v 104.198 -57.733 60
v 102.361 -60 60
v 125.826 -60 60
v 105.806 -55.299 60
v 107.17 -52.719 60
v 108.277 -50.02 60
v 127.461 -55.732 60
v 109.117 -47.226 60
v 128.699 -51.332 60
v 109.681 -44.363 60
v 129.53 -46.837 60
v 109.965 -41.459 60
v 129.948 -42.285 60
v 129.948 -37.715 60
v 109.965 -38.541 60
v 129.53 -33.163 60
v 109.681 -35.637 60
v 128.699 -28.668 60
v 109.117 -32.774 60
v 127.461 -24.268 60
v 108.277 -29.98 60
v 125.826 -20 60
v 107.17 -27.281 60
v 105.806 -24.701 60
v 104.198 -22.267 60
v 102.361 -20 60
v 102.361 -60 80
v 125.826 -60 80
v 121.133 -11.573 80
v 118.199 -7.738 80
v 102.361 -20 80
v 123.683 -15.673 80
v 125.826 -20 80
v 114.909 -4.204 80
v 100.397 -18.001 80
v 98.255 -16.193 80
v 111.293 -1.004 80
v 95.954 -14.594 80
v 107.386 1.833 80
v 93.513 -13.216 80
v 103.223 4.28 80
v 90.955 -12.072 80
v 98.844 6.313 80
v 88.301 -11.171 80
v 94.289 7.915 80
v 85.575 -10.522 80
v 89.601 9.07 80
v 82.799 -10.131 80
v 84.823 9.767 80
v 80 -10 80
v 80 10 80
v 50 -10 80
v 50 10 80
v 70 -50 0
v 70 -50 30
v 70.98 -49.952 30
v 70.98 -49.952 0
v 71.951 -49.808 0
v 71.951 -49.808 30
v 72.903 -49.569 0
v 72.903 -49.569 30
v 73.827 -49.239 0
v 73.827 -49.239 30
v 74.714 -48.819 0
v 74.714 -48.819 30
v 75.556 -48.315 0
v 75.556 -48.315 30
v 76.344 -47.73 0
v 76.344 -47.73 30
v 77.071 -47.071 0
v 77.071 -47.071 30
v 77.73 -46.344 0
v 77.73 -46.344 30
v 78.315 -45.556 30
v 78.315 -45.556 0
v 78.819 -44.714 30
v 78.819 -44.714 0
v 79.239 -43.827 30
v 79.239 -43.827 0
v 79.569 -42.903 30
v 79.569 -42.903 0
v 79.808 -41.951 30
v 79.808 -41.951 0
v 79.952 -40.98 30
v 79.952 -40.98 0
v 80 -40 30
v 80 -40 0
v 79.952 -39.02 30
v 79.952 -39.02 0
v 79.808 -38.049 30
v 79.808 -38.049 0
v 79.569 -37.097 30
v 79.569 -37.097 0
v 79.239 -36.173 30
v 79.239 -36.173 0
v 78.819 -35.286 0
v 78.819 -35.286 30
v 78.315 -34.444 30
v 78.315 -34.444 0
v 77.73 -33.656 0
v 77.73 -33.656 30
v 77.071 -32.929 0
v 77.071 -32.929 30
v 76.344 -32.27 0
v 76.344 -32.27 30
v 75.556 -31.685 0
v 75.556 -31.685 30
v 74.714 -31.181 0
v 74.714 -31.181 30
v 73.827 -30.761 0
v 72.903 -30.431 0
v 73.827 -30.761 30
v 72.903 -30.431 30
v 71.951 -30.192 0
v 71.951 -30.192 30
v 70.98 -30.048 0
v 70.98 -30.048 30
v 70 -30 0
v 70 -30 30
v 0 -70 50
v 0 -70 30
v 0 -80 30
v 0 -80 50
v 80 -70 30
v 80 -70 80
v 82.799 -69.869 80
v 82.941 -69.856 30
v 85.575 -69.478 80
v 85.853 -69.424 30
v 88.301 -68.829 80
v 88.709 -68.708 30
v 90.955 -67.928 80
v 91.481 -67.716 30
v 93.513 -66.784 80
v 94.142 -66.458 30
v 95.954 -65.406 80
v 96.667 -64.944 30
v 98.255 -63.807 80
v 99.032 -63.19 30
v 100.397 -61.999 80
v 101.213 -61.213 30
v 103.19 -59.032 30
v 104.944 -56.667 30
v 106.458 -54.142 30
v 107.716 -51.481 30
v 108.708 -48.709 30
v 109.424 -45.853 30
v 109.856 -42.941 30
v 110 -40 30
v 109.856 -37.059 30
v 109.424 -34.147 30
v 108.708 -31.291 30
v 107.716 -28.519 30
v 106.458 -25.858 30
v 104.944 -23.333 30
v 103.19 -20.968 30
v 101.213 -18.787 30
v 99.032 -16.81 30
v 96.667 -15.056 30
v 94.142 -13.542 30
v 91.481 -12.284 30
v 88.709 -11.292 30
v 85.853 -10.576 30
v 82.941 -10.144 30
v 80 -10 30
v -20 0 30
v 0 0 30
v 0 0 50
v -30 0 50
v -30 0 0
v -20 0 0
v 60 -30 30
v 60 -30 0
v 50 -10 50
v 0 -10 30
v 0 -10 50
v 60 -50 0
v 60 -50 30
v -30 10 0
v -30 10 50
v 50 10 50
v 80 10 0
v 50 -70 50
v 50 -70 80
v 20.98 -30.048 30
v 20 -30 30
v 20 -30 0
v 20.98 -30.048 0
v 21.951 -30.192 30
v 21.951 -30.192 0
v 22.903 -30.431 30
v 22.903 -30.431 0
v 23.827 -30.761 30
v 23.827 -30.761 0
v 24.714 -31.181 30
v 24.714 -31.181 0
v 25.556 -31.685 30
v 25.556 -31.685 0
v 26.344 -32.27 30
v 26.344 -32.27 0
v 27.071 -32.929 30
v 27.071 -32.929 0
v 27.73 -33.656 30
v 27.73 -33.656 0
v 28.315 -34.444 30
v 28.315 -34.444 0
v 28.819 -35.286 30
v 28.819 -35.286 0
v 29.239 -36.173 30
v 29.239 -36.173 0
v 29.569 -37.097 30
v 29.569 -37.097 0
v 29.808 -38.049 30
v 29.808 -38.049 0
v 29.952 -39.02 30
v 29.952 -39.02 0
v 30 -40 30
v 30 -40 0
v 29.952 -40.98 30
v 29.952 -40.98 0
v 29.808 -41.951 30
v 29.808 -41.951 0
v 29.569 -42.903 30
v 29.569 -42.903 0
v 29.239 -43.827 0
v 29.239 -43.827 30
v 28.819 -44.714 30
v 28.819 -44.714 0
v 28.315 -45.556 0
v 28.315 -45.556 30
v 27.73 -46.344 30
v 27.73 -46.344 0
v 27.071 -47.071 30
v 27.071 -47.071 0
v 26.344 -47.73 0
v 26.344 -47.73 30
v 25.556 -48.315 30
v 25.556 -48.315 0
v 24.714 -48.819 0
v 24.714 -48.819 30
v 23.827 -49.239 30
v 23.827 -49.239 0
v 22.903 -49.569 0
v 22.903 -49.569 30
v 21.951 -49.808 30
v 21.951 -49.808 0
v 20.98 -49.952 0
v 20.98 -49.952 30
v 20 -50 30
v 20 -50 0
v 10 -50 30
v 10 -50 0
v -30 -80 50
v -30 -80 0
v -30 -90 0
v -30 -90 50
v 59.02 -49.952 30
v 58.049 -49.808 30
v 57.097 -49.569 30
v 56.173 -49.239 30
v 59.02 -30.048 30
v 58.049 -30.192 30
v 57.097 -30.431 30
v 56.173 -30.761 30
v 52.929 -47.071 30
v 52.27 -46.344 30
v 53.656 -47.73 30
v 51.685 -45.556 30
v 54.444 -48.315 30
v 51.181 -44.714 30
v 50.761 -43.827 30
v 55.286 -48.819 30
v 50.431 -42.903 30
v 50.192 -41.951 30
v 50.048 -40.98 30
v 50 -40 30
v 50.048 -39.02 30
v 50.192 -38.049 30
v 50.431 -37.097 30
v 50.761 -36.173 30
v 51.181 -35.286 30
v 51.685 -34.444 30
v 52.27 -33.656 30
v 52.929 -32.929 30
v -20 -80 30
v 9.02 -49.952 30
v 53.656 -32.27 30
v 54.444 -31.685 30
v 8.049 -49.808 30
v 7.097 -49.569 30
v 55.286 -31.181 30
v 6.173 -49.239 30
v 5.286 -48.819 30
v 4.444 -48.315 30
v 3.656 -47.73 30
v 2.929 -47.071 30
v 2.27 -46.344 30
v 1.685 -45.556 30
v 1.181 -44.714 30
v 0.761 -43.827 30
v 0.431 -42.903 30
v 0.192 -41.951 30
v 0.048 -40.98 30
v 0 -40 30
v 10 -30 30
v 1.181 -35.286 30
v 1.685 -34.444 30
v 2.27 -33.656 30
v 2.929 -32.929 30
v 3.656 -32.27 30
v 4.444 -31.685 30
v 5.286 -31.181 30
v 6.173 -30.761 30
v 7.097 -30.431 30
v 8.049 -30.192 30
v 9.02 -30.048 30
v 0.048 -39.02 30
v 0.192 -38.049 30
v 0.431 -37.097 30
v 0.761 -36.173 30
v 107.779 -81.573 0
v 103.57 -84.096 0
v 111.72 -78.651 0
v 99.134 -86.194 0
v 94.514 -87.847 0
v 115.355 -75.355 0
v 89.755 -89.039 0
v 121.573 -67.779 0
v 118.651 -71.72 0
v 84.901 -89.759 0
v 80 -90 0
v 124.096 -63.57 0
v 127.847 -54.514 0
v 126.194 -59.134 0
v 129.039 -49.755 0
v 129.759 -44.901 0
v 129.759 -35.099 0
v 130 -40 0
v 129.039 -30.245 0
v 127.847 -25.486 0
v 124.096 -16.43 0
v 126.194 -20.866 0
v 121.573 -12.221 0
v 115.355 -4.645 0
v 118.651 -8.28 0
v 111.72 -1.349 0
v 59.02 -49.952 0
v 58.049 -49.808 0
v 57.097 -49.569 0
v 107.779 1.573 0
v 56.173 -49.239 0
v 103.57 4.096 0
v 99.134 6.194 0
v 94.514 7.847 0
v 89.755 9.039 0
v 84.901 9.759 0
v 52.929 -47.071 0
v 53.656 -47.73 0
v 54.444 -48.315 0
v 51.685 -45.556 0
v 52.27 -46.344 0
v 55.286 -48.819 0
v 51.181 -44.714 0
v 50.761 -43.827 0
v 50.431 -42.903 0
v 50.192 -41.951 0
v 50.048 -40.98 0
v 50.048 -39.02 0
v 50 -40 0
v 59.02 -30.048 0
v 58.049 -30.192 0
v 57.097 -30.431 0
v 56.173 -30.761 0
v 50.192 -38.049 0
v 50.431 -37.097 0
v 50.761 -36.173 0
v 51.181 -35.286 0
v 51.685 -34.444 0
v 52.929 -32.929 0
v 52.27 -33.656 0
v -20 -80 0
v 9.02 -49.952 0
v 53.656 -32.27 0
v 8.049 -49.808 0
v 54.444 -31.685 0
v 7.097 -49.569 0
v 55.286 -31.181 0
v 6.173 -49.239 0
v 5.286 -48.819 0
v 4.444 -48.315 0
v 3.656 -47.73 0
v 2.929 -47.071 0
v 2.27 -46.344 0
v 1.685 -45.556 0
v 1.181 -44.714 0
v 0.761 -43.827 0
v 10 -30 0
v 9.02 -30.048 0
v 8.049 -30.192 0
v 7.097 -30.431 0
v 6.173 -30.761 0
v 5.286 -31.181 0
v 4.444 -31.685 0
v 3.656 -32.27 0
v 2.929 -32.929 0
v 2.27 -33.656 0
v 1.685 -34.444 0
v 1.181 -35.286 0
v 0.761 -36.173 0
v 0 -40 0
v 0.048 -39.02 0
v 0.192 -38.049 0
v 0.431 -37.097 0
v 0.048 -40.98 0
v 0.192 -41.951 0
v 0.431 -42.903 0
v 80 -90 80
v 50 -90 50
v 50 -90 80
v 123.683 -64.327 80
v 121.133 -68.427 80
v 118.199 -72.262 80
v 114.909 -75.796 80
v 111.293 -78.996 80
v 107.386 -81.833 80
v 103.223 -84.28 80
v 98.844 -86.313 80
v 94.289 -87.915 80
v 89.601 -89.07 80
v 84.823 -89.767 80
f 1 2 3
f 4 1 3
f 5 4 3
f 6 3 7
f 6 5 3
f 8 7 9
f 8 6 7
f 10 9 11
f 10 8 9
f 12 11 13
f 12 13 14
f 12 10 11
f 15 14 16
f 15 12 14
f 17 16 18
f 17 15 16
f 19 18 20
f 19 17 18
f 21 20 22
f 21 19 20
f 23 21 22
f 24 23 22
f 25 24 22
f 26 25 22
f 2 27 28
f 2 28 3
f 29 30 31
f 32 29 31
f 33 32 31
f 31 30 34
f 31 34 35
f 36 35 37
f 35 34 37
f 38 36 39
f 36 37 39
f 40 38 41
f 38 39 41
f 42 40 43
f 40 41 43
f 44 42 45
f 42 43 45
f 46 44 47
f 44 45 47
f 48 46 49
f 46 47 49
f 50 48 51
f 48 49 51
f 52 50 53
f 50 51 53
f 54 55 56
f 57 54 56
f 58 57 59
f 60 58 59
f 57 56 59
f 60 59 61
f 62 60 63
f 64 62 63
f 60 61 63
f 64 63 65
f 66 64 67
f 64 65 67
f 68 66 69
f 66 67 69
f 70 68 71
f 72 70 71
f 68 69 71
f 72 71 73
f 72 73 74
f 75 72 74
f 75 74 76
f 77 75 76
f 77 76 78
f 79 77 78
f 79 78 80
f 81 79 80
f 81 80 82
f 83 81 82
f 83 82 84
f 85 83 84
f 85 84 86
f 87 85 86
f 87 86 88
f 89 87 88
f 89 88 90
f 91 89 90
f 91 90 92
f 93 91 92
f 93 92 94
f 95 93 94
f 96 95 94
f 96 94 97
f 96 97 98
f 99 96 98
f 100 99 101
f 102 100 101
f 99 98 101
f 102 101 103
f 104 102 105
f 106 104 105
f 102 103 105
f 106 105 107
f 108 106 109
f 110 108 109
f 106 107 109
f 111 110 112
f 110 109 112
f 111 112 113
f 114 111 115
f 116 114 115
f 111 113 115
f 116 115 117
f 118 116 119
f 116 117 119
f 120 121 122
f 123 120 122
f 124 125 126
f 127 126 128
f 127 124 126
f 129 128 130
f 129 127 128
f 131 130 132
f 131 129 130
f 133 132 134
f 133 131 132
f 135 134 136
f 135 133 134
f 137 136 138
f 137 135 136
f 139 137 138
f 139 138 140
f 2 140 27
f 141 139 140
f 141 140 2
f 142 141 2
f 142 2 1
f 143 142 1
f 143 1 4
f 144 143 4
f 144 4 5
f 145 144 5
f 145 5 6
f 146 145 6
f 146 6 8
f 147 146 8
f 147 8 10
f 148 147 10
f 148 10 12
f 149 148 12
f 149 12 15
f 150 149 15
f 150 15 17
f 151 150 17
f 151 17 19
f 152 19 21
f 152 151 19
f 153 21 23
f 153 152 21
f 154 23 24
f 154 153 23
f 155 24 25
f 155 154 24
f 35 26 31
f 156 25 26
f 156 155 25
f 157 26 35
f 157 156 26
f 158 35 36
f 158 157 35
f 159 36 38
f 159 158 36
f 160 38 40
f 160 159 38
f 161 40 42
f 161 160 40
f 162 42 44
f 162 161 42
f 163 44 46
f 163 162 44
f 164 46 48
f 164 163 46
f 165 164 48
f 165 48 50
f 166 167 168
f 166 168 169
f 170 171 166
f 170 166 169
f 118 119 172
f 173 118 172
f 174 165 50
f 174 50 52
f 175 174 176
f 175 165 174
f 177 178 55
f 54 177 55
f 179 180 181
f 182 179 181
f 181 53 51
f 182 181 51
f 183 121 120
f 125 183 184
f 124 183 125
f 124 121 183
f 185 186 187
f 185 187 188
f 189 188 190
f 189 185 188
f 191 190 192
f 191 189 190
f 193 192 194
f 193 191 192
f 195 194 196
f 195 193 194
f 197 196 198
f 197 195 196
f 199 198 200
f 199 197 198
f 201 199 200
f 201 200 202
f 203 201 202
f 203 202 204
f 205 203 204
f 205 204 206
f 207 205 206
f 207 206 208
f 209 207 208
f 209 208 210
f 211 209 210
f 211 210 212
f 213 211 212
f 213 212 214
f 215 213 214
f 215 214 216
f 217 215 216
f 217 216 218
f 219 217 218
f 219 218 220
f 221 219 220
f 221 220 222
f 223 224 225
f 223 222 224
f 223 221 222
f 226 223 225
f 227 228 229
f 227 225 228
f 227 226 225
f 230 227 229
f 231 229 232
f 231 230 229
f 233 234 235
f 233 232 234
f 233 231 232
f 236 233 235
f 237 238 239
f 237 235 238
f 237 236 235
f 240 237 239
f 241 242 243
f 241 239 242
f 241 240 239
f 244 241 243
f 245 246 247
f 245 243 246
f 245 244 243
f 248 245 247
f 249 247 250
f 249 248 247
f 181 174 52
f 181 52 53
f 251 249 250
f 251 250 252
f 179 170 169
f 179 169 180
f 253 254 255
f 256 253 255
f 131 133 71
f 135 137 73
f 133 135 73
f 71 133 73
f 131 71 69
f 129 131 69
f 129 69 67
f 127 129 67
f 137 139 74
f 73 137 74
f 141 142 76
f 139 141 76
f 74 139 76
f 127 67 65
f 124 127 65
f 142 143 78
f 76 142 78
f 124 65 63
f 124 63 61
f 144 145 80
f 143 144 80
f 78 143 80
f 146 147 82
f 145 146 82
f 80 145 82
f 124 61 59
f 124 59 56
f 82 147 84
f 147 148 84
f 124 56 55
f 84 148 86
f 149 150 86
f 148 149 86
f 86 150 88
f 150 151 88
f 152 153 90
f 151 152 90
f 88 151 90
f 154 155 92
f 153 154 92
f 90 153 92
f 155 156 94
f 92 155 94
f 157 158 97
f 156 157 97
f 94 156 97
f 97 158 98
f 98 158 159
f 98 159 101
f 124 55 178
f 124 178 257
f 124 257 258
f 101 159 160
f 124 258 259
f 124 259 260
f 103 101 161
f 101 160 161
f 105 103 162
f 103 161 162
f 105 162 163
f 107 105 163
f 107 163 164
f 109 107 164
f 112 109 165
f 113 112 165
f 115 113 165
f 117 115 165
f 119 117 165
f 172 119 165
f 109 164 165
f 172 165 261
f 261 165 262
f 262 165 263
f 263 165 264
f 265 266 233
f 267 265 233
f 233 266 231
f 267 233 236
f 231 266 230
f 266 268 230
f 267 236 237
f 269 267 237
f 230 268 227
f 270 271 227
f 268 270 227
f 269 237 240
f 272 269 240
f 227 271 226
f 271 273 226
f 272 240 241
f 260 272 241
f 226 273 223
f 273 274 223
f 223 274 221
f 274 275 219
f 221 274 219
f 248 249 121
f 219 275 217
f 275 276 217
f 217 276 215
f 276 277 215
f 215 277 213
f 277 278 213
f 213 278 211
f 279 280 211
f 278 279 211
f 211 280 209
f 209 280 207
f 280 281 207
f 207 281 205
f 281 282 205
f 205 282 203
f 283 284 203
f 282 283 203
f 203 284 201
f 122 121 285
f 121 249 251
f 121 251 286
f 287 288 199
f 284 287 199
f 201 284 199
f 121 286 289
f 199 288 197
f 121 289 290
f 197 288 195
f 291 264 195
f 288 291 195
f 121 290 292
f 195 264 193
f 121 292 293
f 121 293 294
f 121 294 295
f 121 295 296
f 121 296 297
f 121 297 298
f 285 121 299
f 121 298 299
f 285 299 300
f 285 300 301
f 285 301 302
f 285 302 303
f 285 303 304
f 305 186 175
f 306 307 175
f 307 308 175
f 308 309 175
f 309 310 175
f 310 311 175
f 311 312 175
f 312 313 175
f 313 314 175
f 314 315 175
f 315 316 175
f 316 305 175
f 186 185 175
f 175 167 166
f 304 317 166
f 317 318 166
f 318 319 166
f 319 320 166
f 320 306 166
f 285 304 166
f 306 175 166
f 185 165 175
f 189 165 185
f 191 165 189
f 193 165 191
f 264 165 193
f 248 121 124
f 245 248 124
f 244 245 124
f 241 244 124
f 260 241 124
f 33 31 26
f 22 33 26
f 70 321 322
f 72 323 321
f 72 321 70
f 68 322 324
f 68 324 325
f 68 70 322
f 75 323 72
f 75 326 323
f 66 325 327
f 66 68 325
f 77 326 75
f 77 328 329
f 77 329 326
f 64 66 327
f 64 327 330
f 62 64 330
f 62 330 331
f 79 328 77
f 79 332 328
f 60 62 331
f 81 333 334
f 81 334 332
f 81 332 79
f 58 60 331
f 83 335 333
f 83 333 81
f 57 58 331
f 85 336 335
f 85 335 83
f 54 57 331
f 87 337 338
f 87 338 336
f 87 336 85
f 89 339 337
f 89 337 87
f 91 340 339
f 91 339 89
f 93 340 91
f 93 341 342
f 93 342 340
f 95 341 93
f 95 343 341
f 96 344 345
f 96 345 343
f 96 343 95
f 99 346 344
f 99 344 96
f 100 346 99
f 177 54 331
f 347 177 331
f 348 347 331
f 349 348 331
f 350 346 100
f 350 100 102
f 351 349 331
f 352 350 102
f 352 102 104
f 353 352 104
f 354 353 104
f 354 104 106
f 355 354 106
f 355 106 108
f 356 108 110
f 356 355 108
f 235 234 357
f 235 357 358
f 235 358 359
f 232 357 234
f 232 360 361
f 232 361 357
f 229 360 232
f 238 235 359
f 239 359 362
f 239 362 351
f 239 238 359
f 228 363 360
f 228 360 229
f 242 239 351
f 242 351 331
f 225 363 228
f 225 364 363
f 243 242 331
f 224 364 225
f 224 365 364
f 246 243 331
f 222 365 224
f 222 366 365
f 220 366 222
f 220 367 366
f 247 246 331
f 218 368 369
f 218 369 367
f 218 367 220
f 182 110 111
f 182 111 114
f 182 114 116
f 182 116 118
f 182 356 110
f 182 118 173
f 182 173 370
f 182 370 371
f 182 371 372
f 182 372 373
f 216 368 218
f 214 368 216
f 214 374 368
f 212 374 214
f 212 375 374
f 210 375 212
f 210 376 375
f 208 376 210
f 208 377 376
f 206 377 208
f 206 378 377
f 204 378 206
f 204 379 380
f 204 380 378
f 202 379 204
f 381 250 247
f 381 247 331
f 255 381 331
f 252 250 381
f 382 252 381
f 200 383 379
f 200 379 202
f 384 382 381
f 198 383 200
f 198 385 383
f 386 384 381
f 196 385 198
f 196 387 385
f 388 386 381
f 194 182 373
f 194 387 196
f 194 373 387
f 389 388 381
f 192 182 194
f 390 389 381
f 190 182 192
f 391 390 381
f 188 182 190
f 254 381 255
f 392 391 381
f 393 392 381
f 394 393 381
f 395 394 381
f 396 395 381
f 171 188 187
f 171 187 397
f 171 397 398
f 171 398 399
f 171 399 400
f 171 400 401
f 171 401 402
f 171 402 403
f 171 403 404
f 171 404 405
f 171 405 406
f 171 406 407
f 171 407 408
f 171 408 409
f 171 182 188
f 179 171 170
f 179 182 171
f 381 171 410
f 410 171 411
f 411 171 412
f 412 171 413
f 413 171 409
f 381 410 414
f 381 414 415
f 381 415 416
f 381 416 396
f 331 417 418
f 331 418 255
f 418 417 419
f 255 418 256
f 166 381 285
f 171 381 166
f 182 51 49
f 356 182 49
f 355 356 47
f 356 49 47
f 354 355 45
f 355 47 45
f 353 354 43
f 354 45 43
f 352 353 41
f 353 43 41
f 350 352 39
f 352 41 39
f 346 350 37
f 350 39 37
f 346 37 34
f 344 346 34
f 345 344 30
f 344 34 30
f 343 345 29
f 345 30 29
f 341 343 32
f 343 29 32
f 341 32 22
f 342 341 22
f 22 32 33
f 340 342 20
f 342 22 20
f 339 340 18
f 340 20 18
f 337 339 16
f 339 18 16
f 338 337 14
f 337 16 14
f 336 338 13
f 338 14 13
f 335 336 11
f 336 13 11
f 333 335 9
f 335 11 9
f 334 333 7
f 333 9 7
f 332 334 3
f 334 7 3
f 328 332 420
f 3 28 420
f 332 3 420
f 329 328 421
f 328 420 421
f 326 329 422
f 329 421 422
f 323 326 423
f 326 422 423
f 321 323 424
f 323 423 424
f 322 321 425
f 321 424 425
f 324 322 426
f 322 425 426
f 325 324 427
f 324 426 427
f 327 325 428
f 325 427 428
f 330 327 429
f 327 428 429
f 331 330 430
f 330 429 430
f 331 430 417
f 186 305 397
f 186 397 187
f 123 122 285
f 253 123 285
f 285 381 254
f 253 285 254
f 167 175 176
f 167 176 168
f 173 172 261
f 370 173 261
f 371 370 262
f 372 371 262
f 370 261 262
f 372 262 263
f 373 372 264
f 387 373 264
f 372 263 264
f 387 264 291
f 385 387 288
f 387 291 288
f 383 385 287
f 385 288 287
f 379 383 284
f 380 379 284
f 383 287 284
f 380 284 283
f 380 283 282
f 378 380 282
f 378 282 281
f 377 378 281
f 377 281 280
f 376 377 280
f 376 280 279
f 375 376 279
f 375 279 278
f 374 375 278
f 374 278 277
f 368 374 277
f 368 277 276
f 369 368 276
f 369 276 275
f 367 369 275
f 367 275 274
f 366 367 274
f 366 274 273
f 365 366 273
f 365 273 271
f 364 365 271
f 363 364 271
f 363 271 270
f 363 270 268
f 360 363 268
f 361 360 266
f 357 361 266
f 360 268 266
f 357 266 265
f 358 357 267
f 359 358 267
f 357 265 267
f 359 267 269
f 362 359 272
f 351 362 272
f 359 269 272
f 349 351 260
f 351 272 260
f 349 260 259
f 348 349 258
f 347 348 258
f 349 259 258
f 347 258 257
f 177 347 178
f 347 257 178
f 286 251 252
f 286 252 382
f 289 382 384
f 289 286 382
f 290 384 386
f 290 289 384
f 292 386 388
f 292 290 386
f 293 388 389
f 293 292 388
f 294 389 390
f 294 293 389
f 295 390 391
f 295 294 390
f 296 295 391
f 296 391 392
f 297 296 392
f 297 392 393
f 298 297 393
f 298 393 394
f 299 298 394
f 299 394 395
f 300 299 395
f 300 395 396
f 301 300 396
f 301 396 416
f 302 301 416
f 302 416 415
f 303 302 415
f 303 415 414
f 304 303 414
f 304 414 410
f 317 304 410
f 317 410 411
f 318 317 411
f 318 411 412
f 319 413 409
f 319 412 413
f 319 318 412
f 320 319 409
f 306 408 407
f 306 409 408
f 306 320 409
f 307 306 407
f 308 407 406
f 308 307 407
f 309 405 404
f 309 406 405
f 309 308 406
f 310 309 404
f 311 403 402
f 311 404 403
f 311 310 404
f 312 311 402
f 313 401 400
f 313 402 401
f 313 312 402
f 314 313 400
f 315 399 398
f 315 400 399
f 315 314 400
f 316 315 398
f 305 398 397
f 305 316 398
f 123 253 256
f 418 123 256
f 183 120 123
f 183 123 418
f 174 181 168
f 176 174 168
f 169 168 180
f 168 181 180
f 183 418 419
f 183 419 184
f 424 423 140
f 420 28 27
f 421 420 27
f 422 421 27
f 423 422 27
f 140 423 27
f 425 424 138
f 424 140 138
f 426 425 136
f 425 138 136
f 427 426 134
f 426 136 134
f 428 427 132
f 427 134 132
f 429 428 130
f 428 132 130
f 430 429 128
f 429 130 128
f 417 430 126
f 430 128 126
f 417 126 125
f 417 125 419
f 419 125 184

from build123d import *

# Parameters (mm, degrees)
BOSS_EXTRUDE1_DEPTH      = 50
BOSS_EXTRUDE2_DEPTH      = 30
BOSS_EXTRUDE3_DEPTH      = 50
BOSS_EXTRUDE7_DEPTH      = 50
BOSS_EXTRUDE7_DEPTH_BACK = 30
SKETCH5_W                = 20
SKETCH5_H                = 40
CUT_EXTRUDE1_DEPTH       = 211
CUT_EXTRUDE2_DEPTH       = 211
CUT_EXTRUDE3_DEPTH       = 211


with BuildPart() as part:
    # Sketch1 → Boss-Extrude1 (new body)
    with BuildSketch(Plane.XY):
        Polygon((0, 0), (-30, 0), (-30, 10), (50, 10), (50, -10), (0, -10), align=None)
    extrude(amount=BOSS_EXTRUDE1_DEPTH)

    # Sketch2 → Boss-Extrude2 (add)
    with BuildSketch(Plane(origin=(0, 0, 0), x_dir=(-1, 0, 0), z_dir=(0, 0, -1))):
        with BuildLine():
            Line((0, 0), (0, -10))
            Line((0, -10), (-50, -10))
            Line((-50, -10), (-80, -10))
            ThreePointArc((-80, -10), (-110, -40), (-80, -70))
            Line((-80, -70), (0, -70))
            Line((0, -70), (0, -80))
            Line((0, -80), (20, -80))
            Line((20, -80), (20, 0))
            Line((20, 0), (0, 0))
        make_face()
    extrude(amount=-BOSS_EXTRUDE2_DEPTH)

    # Sketch3 → Boss-Extrude3 (add)
    with BuildSketch(Plane(origin=(0, 0, 0), x_dir=(-1, 0, 0), z_dir=(0, 0, -1))):
        Polygon((0, -70), (0, -80), (30, -80), (30, -90), (-50, -90), (-50, -70), align=None)
    extrude(amount=-BOSS_EXTRUDE3_DEPTH)

    # Sketch4 → Boss-Extrude7 (add, two sides)
    with BuildSketch(Plane.XY.offset(30)) as boss_extrude7_sk:
        with BuildLine():
            Line((80, -90), (50, -90))
            Line((50, -90), (50, -70))
            Line((50, -70), (80, -70))
            ThreePointArc((80, -70), (110, -40), (80, -10))
            Line((80, -10), (50, -10))
            Line((50, -10), (50, 10))
            Line((50, 10), (80, 10))
            ThreePointArc((80, 10), (130, -40), (80, -90))
        make_face()
    extrude(amount=BOSS_EXTRUDE7_DEPTH)
    extrude(boss_extrude7_sk.sketch, amount=-BOSS_EXTRUDE7_DEPTH_BACK)

    # Sketch5 → Cut-Extrude1 (cut)
    with BuildSketch(Plane(origin=(0, 0, 0), x_dir=(0, 0, -1), z_dir=(1, 0, 0))):
        with Locations((-70, -40)):
            Rectangle(SKETCH5_W, SKETCH5_H)
    extrude(amount=CUT_EXTRUDE1_DEPTH, mode=Mode.SUBTRACT)

    # Sketch6 → Cut-Extrude2 (cut)
    with BuildSketch(Plane.XY.offset(30)):
        with BuildLine():
            Line((10, -30), (20, -30))
            ThreePointArc((20, -30), (30, -40), (20, -50))
            Line((20, -50), (10, -50))
            ThreePointArc((10, -50), (0, -40), (10, -30))
        make_face()
    extrude(amount=-CUT_EXTRUDE2_DEPTH, mode=Mode.SUBTRACT)

    # Sketch7 → Cut-Extrude3 (cut)
    with BuildSketch(Plane.XY.offset(30)):
        with BuildLine():
            Line((70, -30), (60, -30))
            ThreePointArc((60, -30), (50, -40), (60, -50))
            Line((60, -50), (70, -50))
            ThreePointArc((70, -50), (80, -40), (70, -30))
        make_face()
    extrude(amount=-CUT_EXTRUDE3_DEPTH, mode=Mode.SUBTRACT)


solid = part.part
